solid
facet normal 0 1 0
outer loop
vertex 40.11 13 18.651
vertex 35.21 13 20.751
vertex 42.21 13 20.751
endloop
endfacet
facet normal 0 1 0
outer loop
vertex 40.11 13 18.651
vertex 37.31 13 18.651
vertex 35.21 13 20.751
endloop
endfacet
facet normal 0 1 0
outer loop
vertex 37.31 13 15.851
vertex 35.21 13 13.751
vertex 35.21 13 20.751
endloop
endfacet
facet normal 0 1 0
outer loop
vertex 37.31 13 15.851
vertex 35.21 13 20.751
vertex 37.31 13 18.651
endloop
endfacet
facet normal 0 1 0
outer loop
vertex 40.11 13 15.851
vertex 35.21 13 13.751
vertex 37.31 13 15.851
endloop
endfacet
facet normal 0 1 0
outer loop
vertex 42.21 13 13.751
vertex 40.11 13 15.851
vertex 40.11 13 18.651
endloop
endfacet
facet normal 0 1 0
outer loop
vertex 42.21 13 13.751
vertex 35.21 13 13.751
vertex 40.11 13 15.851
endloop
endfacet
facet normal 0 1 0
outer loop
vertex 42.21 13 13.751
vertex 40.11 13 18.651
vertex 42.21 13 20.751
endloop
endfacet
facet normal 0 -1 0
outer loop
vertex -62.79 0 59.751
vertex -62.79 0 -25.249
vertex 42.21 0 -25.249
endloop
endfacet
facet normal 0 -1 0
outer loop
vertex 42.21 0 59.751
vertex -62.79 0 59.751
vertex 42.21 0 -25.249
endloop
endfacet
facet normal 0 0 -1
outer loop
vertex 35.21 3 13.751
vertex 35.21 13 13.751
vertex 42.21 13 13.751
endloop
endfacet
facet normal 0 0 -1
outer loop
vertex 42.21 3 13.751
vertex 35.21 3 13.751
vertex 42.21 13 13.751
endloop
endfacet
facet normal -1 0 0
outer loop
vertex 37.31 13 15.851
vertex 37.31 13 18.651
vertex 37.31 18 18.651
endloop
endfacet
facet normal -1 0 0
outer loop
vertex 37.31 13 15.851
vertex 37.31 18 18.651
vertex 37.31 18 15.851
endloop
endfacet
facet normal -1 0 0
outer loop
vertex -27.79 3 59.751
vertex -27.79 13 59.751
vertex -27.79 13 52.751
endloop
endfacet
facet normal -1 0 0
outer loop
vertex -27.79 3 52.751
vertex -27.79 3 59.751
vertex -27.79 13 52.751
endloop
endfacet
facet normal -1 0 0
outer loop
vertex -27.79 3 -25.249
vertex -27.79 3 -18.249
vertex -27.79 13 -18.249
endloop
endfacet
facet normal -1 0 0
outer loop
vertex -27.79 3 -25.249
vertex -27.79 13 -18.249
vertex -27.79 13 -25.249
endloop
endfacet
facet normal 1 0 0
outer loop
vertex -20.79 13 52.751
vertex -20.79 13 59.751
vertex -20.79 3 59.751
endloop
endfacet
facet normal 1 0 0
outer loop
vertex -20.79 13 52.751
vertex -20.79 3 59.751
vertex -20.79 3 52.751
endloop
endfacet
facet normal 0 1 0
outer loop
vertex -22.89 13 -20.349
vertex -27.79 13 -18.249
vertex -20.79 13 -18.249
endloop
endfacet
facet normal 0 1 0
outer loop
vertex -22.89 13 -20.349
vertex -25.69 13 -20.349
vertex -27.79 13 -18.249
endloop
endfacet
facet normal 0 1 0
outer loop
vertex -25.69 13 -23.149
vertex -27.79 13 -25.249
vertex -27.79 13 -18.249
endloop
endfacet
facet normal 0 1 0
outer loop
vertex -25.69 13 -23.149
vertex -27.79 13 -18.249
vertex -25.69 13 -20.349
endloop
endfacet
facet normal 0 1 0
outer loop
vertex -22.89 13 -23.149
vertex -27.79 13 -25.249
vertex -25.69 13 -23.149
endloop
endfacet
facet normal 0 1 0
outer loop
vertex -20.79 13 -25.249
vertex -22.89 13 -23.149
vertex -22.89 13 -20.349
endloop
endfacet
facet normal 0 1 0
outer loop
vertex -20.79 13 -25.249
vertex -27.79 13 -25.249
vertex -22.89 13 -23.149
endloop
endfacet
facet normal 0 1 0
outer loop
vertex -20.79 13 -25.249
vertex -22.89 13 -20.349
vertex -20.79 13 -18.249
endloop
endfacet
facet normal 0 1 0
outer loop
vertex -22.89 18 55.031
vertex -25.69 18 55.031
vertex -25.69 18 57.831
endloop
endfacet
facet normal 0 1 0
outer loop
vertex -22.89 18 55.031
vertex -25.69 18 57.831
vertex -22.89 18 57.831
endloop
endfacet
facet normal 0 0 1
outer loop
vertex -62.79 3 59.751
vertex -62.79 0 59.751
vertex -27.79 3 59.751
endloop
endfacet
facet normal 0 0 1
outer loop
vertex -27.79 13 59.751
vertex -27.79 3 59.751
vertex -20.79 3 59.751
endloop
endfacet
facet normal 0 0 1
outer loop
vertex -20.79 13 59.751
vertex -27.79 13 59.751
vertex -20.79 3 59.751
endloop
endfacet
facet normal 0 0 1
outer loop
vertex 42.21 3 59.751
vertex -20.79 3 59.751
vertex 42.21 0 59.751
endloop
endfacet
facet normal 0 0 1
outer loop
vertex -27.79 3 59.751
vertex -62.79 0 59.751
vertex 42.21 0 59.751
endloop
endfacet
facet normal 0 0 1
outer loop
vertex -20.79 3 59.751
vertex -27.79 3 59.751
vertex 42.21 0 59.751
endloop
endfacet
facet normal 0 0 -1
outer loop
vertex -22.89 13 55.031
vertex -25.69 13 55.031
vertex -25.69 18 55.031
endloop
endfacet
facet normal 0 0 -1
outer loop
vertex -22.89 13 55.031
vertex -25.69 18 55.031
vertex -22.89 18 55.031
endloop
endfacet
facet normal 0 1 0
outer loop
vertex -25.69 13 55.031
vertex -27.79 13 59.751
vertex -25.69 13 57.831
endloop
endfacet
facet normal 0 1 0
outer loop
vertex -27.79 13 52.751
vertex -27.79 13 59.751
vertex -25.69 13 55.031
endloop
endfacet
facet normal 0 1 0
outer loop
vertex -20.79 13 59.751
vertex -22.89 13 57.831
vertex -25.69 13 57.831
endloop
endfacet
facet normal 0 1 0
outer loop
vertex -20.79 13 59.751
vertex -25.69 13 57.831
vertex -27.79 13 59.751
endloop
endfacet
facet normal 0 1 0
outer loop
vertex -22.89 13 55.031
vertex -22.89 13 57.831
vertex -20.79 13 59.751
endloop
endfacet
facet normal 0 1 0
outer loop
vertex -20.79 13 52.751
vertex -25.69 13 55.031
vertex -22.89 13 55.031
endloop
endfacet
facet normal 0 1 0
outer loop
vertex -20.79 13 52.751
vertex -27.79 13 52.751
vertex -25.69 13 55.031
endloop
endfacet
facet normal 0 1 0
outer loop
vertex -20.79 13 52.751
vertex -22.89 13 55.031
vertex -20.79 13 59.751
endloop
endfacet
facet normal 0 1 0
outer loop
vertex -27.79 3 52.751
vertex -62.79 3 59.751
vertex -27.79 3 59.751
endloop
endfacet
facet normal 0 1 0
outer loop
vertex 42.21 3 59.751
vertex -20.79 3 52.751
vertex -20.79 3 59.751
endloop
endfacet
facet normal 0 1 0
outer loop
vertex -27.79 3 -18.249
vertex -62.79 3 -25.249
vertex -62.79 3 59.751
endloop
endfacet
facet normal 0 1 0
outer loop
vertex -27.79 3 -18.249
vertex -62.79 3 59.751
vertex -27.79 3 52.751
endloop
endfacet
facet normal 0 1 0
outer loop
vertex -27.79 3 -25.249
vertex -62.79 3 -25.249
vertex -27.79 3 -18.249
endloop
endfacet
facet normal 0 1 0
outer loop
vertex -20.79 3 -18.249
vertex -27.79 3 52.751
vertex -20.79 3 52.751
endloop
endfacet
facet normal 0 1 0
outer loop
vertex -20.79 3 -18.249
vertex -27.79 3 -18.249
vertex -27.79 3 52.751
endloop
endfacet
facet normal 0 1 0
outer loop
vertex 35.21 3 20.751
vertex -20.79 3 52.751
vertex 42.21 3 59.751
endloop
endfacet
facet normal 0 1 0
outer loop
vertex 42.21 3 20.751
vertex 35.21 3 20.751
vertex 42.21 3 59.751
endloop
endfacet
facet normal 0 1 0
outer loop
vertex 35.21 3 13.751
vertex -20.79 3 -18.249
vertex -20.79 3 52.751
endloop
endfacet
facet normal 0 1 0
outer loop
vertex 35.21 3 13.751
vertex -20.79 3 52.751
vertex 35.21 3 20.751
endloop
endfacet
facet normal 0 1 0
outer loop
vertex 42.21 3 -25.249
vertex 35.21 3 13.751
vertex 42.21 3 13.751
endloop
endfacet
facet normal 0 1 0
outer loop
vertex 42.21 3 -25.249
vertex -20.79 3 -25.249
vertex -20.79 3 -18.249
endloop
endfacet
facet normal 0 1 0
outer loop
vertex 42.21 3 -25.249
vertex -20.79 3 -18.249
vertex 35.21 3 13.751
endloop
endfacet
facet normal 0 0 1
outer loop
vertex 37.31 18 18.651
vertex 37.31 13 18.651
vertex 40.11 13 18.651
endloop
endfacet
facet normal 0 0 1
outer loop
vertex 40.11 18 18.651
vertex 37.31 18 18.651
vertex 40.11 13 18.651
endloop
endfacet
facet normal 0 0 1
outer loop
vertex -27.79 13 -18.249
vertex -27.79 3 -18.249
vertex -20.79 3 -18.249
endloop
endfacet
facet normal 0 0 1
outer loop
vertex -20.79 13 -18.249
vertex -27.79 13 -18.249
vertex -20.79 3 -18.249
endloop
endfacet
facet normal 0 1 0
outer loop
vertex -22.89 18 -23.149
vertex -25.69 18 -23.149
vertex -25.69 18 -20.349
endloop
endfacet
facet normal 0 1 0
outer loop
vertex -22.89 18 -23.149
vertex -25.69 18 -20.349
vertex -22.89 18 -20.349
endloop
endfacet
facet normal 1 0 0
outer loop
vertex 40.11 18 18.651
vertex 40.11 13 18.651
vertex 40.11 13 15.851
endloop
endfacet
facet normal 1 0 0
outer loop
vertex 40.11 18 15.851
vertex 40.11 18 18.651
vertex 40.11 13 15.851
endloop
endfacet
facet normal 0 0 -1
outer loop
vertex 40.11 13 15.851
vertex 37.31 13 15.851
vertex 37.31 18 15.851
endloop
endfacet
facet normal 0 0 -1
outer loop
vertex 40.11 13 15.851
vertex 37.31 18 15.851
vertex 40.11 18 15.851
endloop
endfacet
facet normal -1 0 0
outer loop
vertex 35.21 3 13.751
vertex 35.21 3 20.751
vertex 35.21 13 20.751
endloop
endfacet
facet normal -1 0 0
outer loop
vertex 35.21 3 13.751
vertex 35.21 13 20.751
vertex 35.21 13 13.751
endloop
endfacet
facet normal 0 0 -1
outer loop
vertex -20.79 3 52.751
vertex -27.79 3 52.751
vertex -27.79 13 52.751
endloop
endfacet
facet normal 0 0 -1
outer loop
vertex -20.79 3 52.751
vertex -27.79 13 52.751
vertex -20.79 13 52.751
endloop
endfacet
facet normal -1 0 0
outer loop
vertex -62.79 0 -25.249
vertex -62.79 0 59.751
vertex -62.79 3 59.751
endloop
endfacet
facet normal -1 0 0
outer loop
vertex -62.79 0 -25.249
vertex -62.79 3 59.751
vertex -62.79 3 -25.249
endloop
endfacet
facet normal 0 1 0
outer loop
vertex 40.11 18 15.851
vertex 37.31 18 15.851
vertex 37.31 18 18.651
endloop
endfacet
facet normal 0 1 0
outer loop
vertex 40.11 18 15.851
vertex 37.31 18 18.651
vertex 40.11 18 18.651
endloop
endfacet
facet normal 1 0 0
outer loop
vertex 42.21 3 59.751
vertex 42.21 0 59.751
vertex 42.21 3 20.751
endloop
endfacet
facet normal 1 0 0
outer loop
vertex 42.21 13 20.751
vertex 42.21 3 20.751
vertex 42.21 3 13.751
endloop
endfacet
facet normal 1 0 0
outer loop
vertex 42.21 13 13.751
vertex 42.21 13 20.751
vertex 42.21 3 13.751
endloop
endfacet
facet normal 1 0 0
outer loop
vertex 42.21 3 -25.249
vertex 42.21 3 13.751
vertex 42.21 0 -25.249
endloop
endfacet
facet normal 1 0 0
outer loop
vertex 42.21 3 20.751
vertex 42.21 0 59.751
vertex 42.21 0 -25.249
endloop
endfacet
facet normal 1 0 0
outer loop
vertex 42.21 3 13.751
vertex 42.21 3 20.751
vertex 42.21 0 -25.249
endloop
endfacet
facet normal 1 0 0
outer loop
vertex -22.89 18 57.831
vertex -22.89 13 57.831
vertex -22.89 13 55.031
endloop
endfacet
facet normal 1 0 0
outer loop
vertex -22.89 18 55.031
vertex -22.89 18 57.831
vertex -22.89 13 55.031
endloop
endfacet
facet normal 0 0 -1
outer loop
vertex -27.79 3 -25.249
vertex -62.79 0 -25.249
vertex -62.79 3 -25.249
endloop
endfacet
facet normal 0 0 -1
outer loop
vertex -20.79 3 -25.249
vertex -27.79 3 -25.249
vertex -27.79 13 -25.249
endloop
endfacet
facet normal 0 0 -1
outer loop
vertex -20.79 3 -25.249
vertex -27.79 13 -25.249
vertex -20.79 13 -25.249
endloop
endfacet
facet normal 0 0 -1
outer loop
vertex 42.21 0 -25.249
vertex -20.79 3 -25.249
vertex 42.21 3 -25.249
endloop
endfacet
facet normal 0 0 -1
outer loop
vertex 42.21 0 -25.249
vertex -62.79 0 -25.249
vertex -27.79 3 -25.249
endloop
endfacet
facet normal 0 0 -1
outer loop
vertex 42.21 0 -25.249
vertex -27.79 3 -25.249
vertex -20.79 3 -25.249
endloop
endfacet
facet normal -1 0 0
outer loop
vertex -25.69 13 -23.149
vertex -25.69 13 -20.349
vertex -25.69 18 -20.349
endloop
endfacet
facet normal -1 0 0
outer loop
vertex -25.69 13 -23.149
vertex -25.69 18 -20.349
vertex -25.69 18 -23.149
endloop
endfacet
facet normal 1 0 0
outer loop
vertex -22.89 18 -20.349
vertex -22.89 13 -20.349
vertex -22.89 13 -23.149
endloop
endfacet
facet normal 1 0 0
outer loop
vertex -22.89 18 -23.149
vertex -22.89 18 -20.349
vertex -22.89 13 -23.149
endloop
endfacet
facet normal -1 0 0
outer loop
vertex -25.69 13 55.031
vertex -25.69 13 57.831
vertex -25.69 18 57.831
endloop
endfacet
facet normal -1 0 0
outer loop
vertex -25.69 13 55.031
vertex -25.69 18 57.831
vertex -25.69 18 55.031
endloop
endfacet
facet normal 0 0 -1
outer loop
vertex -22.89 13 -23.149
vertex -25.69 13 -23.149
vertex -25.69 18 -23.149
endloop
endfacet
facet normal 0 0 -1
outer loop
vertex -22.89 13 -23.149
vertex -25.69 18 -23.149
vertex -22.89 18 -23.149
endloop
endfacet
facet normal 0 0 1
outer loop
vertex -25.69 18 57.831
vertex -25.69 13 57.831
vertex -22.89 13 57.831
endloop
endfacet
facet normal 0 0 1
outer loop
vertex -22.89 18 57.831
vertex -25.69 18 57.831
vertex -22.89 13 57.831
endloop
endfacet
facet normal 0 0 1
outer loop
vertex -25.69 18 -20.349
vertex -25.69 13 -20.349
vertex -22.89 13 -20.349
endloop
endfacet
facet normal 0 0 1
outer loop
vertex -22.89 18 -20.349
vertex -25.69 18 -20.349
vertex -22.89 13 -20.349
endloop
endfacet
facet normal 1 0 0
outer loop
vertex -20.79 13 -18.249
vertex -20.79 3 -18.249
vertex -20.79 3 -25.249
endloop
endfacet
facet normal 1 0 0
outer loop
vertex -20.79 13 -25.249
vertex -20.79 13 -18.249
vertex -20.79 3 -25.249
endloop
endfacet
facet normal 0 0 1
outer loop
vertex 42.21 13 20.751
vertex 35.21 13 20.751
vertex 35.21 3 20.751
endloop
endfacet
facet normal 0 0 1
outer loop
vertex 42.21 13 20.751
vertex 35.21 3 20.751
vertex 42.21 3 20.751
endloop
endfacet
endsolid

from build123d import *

# Parameters (mm, degrees)
SKETCH1_W            = 105
SKETCH1_H            = 85
BOSS_EXTRUDE1_DEPTH  = 3
SKETCH2_W            = 2.8
SKETCH2_H            = 2.8
BOSS_EXTRUDE2_DEPTH  = 15
SKETCH2_7_W          = 7
SKETCH2_7_H          = 7
SKETCH2_7_W_2        = 2.8
SKETCH2_7_H_2        = 2.8
BOSS_EXTRUDE3_DEPTH  = 10
SKETCH4_W            = 2.8
SKETCH4_H            = 2.8
BOSS_EXTRUDE7_DEPTH  = 15
SKETCH8_W            = 7
SKETCH8_H            = 7
SKETCH8_W_2          = 2.8
SKETCH8_H_2          = 2.8
BOSS_EXTRUDE8_DEPTH  = 10
SKETCH9_W            = 2.8
SKETCH9_H            = 2.8
BOSS_EXTRUDE9_DEPTH  = 15
SKETCH10_W           = 7
SKETCH10_H           = 7
SKETCH10_W_2         = 2.8
SKETCH10_H_2         = 2.8
BOSS_EXTRUDE10_DEPTH = 10


with BuildPart() as part:
    # Sketch1 → Boss-Extrude1 (new body)
    with BuildSketch(Plane(origin=(0, 0, 0), x_dir=(1, 0, 0), z_dir=(0, 1, 0))):
        with Locations((-10.290249703, -17.251010702)):
            Rectangle(SKETCH1_W, SKETCH1_H)
    extrude(amount=BOSS_EXTRUDE1_DEPTH)

    # Sketch2 → Boss-Extrude2 (add)
    with BuildSketch(Plane(origin=(0, 3, 0), x_dir=(1, 0, 0), z_dir=(0, 1, 0))):
        with Locations((-24.290249703, -56.430856566)):
            Rectangle(SKETCH2_W, SKETCH2_H)
    extrude(amount=BOSS_EXTRUDE2_DEPTH)

    # Sketch2<7> → Boss-Extrude3 (add)
    with BuildSketch(Plane(origin=(0, 3, 0), x_dir=(1, 0, 0), z_dir=(0, 1, 0))):
        with Locations((-24.290249703, -56.251010702)):
            Rectangle(SKETCH2_7_W, SKETCH2_7_H)
        with Locations((-24.290249703, -56.430856566)):
            Rectangle(SKETCH2_7_W_2, SKETCH2_7_H_2, mode=Mode.SUBTRACT)
    extrude(amount=BOSS_EXTRUDE3_DEPTH)

    # Sketch4 → Boss-Extrude7 (add)
    with BuildSketch(Plane(origin=(0, 3, 0), x_dir=(1, 0, 0), z_dir=(0, 1, 0))):
        with Locations((-24.290249703, 21.748989298)):
            Rectangle(SKETCH4_W, SKETCH4_H)
    extrude(amount=BOSS_EXTRUDE7_DEPTH)

    # Sketch8 → Boss-Extrude8 (add)
    with BuildSketch(Plane(origin=(0, 3, 0), x_dir=(1, 0, 0), z_dir=(0, 1, 0))):
        with Locations((-24.290249703, 21.748989298)):
            Rectangle(SKETCH8_W, SKETCH8_H)
        with Locations((-24.290249703, 21.748989298)):
            Rectangle(SKETCH8_W_2, SKETCH8_H_2, mode=Mode.SUBTRACT)
    extrude(amount=BOSS_EXTRUDE8_DEPTH)

    # Sketch9 → Boss-Extrude9 (add)
    with BuildSketch(Plane(origin=(0, 3, 0), x_dir=(1, 0, 0), z_dir=(0, 1, 0))):
        with Locations((38.709750297, -17.251010702)):
            Rectangle(SKETCH9_W, SKETCH9_H)
    extrude(amount=BOSS_EXTRUDE9_DEPTH)

    # Sketch10 → Boss-Extrude10 (add)
    with BuildSketch(Plane(origin=(0, 3, 0), x_dir=(1, 0, 0), z_dir=(0, 1, 0))):
        with Locations((38.709750297, -17.251010702)):
            Rectangle(SKETCH10_W, SKETCH10_H)
        with Locations((38.709750297, -17.251010702)):
            Rectangle(SKETCH10_W_2, SKETCH10_H_2, mode=Mode.SUBTRACT)
    extrude(amount=BOSS_EXTRUDE10_DEPTH)


solid = part.part
